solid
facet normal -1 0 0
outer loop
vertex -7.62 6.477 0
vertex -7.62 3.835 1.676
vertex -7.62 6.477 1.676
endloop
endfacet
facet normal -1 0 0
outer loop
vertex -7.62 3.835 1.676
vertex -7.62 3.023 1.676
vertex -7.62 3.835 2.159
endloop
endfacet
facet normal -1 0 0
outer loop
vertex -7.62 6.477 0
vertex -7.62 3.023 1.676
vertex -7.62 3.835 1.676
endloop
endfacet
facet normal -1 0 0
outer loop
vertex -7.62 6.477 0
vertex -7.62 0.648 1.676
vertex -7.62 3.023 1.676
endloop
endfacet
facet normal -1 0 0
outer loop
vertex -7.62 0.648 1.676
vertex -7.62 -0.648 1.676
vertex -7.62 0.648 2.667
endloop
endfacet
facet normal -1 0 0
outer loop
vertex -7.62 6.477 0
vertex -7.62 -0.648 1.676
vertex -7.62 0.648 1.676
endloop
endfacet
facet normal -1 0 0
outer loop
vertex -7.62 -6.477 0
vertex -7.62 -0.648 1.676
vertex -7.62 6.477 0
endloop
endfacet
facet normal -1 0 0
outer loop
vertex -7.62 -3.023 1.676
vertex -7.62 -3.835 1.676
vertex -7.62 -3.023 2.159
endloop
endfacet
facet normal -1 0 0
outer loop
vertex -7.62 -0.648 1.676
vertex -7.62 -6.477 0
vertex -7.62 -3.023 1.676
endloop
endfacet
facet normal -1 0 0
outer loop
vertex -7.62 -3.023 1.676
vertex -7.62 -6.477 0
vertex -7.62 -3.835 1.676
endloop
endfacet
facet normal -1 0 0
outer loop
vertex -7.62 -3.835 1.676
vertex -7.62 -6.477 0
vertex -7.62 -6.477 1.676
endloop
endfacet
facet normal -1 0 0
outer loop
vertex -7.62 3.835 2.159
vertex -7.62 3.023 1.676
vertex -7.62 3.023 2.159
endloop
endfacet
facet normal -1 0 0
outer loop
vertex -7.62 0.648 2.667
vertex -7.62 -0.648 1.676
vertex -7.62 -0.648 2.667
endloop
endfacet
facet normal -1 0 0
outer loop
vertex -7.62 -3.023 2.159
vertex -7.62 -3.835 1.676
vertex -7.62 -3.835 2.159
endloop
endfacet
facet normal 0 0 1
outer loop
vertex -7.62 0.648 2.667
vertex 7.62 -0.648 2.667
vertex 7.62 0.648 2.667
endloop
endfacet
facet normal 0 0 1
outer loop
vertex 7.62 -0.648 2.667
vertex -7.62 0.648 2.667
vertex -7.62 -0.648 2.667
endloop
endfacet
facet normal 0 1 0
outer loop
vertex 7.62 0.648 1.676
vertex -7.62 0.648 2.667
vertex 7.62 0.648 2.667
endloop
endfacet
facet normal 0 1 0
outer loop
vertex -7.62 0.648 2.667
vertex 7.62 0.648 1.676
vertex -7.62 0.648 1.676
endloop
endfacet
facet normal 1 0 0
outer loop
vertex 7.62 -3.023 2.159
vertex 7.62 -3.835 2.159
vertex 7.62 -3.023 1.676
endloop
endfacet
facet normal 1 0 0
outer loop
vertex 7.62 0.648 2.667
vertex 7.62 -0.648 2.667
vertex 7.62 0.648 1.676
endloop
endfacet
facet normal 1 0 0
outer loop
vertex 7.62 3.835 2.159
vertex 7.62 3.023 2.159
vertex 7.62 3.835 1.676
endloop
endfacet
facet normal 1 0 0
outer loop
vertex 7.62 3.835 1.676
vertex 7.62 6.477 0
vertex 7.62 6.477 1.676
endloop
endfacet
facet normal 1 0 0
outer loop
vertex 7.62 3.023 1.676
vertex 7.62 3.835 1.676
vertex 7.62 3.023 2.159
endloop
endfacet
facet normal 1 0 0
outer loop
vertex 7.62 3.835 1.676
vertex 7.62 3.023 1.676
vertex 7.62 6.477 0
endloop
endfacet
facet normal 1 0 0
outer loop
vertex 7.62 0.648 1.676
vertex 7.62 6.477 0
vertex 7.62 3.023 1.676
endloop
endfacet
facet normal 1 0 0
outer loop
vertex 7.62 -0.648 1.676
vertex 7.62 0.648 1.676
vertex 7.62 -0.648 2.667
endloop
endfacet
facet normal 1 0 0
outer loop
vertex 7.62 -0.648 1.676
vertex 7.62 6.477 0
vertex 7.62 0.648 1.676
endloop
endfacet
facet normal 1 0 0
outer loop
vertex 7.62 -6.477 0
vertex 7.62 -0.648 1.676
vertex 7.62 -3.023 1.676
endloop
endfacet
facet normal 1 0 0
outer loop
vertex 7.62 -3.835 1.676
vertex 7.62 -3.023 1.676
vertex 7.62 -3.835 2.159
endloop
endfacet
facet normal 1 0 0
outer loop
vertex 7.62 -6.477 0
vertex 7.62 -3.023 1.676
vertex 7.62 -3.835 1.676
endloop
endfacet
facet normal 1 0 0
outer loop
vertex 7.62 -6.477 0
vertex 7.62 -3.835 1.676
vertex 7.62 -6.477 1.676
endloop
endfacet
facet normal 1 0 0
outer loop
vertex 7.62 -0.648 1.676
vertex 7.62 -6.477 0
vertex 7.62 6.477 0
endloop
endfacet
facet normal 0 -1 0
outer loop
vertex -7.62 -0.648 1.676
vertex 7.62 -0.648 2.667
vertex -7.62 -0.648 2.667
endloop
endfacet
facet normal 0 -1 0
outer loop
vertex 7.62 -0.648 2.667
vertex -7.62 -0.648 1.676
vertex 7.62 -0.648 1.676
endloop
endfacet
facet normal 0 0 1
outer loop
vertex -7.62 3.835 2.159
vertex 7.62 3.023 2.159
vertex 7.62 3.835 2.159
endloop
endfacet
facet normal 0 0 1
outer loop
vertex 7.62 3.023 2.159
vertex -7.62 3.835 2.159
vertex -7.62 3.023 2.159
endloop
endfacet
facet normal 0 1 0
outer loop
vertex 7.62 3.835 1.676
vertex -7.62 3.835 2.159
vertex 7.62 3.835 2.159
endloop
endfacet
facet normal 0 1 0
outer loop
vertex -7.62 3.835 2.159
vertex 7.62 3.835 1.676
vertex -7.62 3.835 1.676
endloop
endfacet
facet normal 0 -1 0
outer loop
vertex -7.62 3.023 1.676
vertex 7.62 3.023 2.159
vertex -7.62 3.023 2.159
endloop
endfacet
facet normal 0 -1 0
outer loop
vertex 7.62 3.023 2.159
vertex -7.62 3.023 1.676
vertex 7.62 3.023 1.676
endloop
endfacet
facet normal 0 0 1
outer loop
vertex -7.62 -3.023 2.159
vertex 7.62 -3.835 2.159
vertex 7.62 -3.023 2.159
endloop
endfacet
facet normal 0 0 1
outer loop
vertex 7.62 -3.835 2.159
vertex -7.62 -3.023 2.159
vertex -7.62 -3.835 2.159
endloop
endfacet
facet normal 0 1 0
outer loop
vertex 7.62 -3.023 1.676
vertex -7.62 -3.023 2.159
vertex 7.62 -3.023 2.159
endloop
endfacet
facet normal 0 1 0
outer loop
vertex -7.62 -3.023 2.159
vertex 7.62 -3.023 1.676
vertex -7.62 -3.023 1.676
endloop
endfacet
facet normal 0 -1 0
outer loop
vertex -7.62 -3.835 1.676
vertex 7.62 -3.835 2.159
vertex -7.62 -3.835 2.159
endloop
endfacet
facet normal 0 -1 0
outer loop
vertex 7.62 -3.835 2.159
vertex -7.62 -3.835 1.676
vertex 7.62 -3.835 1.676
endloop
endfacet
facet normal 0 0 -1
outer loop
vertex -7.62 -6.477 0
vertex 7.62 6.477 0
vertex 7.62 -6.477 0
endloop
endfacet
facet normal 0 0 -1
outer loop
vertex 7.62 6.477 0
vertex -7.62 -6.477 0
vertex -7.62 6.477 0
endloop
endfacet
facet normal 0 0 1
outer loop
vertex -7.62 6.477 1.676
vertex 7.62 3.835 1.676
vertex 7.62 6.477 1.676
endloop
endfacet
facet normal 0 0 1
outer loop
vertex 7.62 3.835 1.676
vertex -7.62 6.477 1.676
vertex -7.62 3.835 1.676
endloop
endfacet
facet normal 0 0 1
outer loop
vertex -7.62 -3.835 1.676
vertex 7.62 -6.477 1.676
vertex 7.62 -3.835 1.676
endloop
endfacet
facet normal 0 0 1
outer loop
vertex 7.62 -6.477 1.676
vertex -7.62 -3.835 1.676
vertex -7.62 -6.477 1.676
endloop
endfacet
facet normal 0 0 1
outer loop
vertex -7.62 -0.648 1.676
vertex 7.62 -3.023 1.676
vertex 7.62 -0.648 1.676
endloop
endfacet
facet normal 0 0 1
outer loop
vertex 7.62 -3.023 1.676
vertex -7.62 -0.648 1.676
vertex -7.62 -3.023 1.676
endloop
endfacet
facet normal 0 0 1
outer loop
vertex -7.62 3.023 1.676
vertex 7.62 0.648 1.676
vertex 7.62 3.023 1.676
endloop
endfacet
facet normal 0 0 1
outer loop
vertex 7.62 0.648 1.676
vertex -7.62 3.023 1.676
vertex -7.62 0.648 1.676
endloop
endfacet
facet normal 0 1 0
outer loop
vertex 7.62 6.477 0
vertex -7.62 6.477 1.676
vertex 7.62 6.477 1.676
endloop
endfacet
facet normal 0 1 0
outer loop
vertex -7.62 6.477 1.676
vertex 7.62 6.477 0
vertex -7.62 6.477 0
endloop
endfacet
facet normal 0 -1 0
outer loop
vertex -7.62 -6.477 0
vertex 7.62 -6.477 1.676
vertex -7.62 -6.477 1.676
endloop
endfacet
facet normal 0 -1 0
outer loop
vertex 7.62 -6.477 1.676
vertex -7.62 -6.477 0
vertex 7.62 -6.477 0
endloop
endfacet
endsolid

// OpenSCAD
// file: ../models/model-levelshifter.scad
ViewScale = [0.0254, 0.0254, 0.0254];

module model_levelshifter()
{
    color("Cyan")
    linear_extrude(66)
    square([600, 510], center=true);

    color("CornflowerBlue")
    {
        // FETs
        translate([0, 0, 65])
        linear_extrude(40)
        square([600, 51], center=true);

        // Resistors
        translate([0, 510/2-20/2-110, 65])
        linear_extrude(20)
        square([600, 32], center=true);

        translate([0, -510/2+20/2+110, 65])
        linear_extrude(20)
        square([600, 32], center=true);
    }


}

scale(ViewScale)
{
    model_levelshifter();
}
// main file
ViewScale = [0.0254, 0.0254, 0.0254];

include <../models/model-levelshifter.scad>

module mount_levelshifter()
{
    linear_extrude(76)
    difference() {
        square([800, 710], center=true);
        translate([-50, 0, 0])
        square([720, 530], center=true);
    }

    translate([0, 0, 75])
    linear_extrude(50)
    difference() {
        square([800, 710], center=true);
        translate([-50, 0, 0])
        square([720, 470], center=true);
    }

    translate([0, 0, -49])
    linear_extrude(50)
    difference() {
        square([800, 710], center=true);
        translate([-50, 0, 0])
        square([720, 470], center=true);
    }
}

//scale(ViewScale)
//{
//   model_levelshifter();
//    mount_levelshifter();
//}
